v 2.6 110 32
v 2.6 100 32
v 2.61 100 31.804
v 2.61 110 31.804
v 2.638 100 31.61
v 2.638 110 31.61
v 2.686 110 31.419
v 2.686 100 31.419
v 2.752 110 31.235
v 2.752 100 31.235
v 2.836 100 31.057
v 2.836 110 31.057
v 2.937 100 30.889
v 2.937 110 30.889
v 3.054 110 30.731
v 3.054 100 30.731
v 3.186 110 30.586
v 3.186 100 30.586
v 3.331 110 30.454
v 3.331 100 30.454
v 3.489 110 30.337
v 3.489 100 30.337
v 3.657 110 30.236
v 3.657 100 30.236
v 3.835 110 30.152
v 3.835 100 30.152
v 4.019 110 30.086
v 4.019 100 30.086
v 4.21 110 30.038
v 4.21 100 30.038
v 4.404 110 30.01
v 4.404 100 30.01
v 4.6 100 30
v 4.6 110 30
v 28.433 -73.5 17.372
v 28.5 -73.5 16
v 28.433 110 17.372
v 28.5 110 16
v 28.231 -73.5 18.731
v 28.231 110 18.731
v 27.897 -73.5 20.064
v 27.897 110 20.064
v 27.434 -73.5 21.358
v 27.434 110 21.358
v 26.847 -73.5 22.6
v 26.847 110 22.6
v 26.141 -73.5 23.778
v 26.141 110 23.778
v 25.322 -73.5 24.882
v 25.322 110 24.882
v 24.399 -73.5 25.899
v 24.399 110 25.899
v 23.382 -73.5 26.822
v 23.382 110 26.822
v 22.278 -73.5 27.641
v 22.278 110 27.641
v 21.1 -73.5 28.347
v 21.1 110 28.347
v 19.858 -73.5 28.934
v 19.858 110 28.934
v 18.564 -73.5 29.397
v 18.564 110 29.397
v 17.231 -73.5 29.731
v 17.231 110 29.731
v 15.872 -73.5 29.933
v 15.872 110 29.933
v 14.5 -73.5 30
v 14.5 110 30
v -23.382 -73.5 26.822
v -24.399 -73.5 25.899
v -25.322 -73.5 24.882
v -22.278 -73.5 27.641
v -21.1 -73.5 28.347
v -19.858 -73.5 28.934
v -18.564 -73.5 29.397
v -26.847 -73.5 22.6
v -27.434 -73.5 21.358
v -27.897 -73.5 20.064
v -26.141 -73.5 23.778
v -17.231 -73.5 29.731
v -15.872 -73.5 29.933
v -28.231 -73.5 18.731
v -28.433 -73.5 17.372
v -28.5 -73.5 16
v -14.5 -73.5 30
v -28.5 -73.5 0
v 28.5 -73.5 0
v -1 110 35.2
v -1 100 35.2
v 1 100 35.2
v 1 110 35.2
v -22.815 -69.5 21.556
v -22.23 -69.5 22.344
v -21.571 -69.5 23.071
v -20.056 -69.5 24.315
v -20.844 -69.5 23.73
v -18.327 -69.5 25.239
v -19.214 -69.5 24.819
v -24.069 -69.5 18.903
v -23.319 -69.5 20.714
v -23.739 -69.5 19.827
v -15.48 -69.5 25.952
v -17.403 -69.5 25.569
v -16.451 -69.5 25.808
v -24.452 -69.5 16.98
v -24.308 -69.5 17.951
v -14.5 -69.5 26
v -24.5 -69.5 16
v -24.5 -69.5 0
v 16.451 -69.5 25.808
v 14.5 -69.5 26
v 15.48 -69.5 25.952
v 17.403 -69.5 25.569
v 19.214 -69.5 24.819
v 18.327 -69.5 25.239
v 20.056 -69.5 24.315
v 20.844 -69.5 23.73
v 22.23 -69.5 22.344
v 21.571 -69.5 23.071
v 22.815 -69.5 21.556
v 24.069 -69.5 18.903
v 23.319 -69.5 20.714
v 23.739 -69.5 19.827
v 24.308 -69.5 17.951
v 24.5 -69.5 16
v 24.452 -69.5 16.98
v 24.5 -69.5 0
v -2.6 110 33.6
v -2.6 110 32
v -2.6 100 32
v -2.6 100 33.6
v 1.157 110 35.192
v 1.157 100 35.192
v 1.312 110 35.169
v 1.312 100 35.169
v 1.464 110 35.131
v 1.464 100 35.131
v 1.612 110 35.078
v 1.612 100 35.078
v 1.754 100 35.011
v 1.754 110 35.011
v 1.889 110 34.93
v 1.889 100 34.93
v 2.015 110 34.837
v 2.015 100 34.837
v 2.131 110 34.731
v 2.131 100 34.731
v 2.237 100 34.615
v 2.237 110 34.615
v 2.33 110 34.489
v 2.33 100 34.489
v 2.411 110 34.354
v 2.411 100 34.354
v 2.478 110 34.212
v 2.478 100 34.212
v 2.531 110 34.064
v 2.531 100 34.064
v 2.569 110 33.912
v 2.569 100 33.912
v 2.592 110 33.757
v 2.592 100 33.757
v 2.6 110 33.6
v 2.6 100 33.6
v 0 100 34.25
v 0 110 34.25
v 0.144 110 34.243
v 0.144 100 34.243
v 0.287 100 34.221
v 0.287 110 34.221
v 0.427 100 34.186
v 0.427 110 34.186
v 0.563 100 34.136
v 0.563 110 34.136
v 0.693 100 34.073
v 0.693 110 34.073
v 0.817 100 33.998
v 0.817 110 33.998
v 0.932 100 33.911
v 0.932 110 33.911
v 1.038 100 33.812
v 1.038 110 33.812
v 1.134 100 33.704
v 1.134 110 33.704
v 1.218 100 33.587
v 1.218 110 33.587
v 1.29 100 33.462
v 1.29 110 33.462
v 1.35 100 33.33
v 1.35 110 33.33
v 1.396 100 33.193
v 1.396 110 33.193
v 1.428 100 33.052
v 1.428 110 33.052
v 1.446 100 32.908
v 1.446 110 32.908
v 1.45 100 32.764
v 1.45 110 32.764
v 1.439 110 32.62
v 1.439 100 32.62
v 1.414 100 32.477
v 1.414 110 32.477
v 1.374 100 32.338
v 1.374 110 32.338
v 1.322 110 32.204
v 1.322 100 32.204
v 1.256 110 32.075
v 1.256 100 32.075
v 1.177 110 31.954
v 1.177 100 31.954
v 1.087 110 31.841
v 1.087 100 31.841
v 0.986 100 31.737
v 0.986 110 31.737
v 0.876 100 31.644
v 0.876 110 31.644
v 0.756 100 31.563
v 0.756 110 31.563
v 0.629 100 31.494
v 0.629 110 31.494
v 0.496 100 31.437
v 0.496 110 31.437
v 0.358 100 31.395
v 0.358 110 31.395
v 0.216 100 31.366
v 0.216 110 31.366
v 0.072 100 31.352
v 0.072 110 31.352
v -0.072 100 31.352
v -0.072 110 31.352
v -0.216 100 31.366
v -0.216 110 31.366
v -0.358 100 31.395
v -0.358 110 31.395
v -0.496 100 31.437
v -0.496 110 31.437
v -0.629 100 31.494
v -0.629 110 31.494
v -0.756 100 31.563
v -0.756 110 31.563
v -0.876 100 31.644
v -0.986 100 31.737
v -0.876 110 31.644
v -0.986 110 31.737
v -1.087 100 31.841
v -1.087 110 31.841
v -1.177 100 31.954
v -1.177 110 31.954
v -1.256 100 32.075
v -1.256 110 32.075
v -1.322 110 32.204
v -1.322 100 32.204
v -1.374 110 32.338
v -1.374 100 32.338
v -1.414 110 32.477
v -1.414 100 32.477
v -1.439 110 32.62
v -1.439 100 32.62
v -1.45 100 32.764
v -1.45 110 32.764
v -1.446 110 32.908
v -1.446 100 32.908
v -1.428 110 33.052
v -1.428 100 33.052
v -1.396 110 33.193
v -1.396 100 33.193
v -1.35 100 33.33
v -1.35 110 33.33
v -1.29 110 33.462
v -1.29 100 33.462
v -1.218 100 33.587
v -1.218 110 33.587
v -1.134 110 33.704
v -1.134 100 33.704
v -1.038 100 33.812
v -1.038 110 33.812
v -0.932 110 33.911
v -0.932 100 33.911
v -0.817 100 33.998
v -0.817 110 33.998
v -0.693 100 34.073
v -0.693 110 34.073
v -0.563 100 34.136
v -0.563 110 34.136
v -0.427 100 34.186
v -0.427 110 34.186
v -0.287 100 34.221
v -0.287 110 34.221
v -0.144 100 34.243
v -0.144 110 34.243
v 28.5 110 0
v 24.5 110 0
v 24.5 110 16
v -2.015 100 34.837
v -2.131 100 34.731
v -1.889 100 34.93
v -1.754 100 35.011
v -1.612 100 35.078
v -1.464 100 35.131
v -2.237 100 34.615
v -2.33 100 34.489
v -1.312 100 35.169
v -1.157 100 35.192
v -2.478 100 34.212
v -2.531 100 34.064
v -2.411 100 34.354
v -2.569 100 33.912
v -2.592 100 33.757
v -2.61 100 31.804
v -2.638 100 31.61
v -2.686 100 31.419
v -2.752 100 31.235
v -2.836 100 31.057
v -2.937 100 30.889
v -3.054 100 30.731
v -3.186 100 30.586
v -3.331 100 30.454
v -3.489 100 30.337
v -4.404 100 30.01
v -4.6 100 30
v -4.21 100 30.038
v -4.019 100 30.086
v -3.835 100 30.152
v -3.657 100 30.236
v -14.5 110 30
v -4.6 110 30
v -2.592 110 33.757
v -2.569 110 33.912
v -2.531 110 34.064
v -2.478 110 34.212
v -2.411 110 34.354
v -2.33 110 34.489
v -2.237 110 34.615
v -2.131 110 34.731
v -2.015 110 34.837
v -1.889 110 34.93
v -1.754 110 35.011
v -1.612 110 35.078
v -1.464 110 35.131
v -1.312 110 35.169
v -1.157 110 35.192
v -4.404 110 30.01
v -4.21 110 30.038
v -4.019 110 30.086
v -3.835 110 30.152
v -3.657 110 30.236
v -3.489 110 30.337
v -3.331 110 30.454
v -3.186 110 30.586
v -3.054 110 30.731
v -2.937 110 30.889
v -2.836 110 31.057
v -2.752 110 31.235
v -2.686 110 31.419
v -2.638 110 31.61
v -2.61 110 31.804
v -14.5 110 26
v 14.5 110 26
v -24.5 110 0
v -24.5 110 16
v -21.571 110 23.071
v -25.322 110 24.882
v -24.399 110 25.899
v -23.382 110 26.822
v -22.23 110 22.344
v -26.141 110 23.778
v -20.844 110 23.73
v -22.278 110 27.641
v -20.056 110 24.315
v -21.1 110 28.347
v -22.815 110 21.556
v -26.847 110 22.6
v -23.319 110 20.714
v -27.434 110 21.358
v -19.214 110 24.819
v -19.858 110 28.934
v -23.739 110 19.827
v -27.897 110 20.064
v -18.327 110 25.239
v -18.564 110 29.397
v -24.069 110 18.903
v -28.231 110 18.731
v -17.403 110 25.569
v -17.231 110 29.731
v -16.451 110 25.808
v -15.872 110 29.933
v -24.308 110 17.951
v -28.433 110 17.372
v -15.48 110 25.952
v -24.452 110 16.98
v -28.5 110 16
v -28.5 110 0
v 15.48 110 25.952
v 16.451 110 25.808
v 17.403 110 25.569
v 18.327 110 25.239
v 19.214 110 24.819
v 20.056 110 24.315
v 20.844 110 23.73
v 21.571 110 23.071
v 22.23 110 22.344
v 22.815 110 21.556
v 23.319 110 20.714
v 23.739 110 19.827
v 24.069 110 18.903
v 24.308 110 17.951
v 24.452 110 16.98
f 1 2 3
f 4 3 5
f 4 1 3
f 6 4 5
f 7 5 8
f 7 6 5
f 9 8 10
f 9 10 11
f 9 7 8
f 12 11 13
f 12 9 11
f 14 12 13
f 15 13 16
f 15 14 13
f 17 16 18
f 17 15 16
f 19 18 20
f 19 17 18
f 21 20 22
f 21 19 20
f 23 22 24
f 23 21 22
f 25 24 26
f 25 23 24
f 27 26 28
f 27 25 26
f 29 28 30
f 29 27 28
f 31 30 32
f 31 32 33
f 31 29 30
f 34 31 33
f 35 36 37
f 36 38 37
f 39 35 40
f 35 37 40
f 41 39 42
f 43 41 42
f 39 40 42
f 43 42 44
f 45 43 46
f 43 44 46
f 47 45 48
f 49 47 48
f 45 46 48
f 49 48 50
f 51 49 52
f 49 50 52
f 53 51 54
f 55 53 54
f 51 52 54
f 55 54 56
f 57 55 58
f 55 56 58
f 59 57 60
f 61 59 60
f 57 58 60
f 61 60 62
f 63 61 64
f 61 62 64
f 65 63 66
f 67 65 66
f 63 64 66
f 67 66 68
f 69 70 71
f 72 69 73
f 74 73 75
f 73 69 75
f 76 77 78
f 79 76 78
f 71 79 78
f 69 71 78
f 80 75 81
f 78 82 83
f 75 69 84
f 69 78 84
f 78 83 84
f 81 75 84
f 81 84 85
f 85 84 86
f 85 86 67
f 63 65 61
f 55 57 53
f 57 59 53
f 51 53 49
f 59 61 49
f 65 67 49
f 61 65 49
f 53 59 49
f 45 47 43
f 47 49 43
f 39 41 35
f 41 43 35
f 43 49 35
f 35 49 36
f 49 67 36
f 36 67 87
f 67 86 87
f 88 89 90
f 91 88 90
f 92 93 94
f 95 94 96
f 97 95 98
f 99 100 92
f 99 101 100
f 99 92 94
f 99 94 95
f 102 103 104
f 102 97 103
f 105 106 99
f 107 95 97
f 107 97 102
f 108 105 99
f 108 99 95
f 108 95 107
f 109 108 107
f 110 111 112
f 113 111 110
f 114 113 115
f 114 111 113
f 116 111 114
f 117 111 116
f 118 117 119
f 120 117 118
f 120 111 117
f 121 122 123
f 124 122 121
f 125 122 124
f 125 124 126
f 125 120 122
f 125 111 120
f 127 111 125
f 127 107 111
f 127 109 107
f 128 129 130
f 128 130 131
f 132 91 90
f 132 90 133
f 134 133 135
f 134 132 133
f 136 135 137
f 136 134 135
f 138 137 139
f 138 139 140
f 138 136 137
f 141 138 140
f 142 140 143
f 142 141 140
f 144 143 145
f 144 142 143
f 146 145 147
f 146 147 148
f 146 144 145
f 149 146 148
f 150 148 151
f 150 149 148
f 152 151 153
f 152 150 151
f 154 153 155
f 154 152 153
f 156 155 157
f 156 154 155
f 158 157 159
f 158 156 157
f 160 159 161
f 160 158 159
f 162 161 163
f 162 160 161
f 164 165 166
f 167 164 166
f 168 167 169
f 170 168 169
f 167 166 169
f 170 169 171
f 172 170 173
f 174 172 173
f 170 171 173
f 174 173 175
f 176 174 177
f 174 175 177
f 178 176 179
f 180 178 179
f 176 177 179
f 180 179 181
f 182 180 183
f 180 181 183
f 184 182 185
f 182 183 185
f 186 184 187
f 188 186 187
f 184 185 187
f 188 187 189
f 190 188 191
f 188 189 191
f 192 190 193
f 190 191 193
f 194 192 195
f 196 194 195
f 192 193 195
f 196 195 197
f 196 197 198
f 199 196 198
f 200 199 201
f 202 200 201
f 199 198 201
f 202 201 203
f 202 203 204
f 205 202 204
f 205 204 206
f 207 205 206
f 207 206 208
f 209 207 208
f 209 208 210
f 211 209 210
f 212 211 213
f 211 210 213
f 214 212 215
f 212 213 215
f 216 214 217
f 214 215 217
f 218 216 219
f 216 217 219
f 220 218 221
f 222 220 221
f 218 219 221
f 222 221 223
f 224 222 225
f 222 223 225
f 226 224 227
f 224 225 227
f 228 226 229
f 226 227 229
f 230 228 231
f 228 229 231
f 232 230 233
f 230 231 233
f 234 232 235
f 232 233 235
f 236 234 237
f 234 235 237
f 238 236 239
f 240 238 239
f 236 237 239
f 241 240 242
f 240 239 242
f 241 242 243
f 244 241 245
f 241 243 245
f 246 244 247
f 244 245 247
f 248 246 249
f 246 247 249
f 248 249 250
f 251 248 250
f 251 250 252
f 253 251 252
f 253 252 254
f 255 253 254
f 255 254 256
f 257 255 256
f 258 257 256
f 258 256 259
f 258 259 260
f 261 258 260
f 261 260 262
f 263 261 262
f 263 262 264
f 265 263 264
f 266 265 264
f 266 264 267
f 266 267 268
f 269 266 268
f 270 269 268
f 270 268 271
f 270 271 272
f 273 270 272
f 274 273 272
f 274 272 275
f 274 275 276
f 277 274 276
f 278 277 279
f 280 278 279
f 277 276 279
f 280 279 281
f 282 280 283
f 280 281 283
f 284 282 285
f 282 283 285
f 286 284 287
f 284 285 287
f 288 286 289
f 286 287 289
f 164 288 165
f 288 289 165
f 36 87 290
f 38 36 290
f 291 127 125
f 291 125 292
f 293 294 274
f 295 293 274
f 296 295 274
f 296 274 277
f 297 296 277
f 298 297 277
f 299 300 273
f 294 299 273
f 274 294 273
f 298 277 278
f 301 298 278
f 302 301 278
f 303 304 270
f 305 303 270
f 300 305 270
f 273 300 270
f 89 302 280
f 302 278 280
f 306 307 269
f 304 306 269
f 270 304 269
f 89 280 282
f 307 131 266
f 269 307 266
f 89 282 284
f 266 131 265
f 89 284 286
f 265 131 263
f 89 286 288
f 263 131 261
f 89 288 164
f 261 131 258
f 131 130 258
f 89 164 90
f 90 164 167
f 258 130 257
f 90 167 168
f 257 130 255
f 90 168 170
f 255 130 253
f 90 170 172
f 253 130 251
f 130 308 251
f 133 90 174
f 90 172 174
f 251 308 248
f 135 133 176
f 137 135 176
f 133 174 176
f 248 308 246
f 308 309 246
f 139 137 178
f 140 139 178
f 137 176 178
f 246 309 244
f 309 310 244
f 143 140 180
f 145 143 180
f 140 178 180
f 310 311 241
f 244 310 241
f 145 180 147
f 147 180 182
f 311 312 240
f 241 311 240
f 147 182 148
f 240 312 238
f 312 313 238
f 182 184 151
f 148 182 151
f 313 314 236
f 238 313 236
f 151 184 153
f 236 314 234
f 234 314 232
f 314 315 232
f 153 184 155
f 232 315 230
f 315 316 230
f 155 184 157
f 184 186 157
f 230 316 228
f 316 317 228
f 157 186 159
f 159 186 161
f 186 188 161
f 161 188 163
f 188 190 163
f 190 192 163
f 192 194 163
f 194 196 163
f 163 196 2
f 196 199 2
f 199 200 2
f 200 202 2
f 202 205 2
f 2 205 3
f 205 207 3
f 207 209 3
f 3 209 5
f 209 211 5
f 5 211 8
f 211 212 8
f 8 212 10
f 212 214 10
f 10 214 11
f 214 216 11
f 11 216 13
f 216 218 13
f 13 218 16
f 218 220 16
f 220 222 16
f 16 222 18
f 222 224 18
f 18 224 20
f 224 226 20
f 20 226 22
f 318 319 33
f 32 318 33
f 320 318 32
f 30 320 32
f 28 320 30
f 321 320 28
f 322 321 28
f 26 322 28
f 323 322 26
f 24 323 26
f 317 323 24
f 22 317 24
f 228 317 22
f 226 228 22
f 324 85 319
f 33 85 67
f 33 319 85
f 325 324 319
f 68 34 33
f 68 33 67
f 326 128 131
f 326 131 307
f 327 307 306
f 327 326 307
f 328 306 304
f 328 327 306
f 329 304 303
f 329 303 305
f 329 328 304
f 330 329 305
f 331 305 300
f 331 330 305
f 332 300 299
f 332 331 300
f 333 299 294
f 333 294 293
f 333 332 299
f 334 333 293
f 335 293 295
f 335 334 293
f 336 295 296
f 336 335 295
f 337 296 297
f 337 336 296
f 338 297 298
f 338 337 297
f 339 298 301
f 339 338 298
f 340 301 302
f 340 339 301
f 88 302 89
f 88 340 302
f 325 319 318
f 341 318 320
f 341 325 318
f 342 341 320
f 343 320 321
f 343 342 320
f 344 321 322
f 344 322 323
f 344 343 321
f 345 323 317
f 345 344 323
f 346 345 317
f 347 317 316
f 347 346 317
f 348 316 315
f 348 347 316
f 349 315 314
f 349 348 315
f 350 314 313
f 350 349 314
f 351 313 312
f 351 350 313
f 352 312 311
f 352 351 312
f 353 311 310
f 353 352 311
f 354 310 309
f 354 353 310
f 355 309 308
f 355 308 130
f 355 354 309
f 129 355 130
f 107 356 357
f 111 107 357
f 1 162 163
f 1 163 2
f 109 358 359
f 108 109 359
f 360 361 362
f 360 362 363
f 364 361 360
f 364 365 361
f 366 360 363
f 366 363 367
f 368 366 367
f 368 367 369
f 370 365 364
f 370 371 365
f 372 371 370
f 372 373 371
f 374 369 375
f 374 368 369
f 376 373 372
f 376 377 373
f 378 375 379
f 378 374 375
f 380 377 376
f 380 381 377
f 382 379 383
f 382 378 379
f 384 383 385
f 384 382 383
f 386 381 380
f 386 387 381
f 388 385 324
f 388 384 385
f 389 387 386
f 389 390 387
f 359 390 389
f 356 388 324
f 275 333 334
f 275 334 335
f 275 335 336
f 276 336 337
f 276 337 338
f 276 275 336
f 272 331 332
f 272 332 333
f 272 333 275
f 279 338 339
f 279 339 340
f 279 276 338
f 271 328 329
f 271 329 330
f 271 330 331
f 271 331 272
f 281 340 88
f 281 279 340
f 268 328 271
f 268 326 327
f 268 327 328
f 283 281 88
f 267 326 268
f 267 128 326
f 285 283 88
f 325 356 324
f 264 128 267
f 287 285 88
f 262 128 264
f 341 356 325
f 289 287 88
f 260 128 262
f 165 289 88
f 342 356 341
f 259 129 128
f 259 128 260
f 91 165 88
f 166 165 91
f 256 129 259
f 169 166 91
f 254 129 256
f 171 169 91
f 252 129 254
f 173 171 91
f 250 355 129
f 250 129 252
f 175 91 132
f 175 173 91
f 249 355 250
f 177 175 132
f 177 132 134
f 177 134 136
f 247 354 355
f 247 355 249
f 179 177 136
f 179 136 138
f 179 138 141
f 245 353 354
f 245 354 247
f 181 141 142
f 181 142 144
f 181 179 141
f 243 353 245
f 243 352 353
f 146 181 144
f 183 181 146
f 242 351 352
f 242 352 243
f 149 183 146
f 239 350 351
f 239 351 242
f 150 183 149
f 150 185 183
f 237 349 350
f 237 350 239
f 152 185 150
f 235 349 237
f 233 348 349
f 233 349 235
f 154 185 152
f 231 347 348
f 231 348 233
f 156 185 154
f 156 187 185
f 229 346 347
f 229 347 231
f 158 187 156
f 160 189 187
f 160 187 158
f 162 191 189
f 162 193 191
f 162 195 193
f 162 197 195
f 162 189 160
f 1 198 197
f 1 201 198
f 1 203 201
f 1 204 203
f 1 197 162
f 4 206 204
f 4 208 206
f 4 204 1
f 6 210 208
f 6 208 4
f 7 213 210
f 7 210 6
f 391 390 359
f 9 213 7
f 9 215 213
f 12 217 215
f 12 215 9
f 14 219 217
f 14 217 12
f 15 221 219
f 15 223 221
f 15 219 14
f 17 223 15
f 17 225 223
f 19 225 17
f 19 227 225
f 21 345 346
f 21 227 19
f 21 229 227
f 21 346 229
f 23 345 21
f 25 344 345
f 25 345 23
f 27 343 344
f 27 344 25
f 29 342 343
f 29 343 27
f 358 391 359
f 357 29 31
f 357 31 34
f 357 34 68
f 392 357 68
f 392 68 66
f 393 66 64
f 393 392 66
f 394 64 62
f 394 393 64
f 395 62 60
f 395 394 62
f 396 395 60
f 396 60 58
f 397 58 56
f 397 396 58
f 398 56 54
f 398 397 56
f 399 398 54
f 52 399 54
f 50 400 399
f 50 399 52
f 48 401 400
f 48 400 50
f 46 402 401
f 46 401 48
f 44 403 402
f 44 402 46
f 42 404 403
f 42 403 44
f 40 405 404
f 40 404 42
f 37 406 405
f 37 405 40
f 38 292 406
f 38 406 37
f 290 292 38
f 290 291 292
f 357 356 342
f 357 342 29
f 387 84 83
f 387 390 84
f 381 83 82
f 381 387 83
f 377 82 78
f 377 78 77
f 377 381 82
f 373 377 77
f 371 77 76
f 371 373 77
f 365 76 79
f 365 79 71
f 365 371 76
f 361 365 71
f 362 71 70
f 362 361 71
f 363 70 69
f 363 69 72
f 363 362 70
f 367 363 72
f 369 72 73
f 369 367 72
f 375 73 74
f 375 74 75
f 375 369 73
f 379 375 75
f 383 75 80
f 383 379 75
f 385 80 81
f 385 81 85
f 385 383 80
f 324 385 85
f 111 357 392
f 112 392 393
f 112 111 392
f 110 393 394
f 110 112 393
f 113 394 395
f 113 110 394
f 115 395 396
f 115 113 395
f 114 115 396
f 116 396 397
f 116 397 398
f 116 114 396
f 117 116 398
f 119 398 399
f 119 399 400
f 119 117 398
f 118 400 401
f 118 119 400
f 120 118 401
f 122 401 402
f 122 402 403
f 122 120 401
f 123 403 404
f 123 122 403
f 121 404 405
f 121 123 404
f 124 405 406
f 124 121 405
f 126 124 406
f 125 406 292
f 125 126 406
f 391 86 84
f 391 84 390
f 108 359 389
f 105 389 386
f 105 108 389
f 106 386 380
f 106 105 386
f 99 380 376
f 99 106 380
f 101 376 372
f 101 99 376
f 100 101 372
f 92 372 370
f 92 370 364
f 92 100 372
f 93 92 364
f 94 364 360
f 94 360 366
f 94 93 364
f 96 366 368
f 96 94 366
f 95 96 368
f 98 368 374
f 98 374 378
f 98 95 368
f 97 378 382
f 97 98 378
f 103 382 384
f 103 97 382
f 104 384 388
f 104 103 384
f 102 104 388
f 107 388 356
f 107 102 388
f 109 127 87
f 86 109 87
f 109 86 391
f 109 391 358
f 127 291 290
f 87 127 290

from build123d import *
from build123d.topology import SkipClean

# Parameters (mm, degrees)
SKETCH1_W           = 57
SKETCH1_H           = 183.5
SKETCH1_W_2         = 49
SKETCH1_H_2         = 175.5
BOSS_EXTRUDE1_DEPTH = 30
BOSS_EXTRUDE2_DEPTH = 175.5
FILLET1_R           = 14
CUT_EXTRUDE1_DEPTH  = 179.5
SKETCH6_R           = 1.6
SKETCH6_R_2         = 1.45
BOSS_EXTRUDE5_DEPTH = 10


with BuildPart() as part:
    # Sketch1 → Boss-Extrude1 (new body)
    with BuildSketch(Plane.XY):
        with Locations((0, 18.25)):
            Rectangle(SKETCH1_W, SKETCH1_H)
        with Locations((0, 18.25)):
            Rectangle(SKETCH1_W_2, SKETCH1_H_2, mode=Mode.SUBTRACT)
    extrude(amount=BOSS_EXTRUDE1_DEPTH)

    # Sketch2 → Boss-Extrude2 (add)
    with BuildSketch(Plane(origin=(0, -69.5, 0), x_dir=(1, 0, 0), z_dir=(0, 1, 0))):
        with BuildLine():
            Line((14.5, -26), (24.5, -26))
            Line((24.5, -26), (24.5, -16))
            ThreePointArc((24.5, -16), (21.571067812, -23.071067812), (14.5, -26))
        make_face()
        Polygon((-24.5, -30), (24.5, -30), (24.5, -26), (14.5, -26), (-14.5, -26), (-24.5, -26), align=None)
        with BuildLine():
            Line((-24.5, -16), (-24.5, -26))
            Line((-24.5, -26), (-14.5, -26))
            ThreePointArc((-14.5, -26), (-21.571067812, -23.071067812), (-24.5, -16))
        make_face()
    extrude(amount=BOSS_EXTRUDE2_DEPTH)

    # Fillet1
    fillet1_edges = [part.edges().sort_by_distance(p)[0] for p in [
        (-28.5, 18.25, 30),
        (28.5, 18.25, 30),
    ]]
    fillet(fillet1_edges, radius=FILLET1_R)

    # Sketch2<4> → Cut-Extrude1 (cut)
    with SkipClean():  # the faces are left unmerged after this step: merging them gives an invalid solid
        with BuildSketch(Plane(origin=(0, -69.5, 0), x_dir=(1, 0, 0), z_dir=(0, 1, 0))):
            with BuildLine():
                Line((-14.5, -26), (14.5, -26))
                ThreePointArc((14.5, -26), (21.571067812, -23.071067812), (24.5, -16))
                Line((24.5, -16), (24.5, 0))
                Line((24.5, 0), (-24.5, 0))
                Line((-24.5, 0), (-24.5, -16))
                ThreePointArc((-24.5, -16), (-21.571067812, -23.071067812), (-14.5, -26))
            make_face()
        extrude(amount=CUT_EXTRUDE1_DEPTH, mode=Mode.SUBTRACT)
    add(part.part.scale(1), mode=Mode.REPLACE)  # the faces are merged on a copy

    # Sketch6 → Boss-Extrude5 (add)
    # profile 1 of 2: a face of its own
    with BuildSketch(Plane(origin=(0, 110, 0), x_dir=(1, 0, 0), z_dir=(0, 1, 0))):
        with BuildLine():
            ThreePointArc((1, -35.2), (2.13137085, -34.73137085), (2.6, -33.6))
            Line((2.6, -33.6), (2.6, -32))
            ThreePointArc((2.6, -32), (3.185786438, -30.585786438), (4.6, -30))
            Line((4.6, -30), (-4.6, -30))
            ThreePointArc((-4.6, -30), (-3.185786438, -30.585786438), (-2.6, -32))
            Line((-2.6, -32), (-2.6, -33.6))
            ThreePointArc((-2.6, -33.6), (-2.13137085, -34.73137085), (-1, -35.2))
            Line((-1, -35.2), (1, -35.2))
        make_face()
        with Locations((0, -32.8)):
            Circle(SKETCH6_R, mode=Mode.SUBTRACT)
    # profile 2 of 2: a face of its own
    with BuildSketch(Plane(origin=(0, 110, 0), x_dir=(1, 0, 0), z_dir=(0, 1, 0))):
        with Locations((0, -32.8)):
            Circle(SKETCH6_R)
        with Locations(Location((0, -32.8, 0), (0, 0, 270))):
            Circle(SKETCH6_R_2, mode=Mode.SUBTRACT)
    extrude(amount=-BOSS_EXTRUDE5_DEPTH)


solid = part.part
